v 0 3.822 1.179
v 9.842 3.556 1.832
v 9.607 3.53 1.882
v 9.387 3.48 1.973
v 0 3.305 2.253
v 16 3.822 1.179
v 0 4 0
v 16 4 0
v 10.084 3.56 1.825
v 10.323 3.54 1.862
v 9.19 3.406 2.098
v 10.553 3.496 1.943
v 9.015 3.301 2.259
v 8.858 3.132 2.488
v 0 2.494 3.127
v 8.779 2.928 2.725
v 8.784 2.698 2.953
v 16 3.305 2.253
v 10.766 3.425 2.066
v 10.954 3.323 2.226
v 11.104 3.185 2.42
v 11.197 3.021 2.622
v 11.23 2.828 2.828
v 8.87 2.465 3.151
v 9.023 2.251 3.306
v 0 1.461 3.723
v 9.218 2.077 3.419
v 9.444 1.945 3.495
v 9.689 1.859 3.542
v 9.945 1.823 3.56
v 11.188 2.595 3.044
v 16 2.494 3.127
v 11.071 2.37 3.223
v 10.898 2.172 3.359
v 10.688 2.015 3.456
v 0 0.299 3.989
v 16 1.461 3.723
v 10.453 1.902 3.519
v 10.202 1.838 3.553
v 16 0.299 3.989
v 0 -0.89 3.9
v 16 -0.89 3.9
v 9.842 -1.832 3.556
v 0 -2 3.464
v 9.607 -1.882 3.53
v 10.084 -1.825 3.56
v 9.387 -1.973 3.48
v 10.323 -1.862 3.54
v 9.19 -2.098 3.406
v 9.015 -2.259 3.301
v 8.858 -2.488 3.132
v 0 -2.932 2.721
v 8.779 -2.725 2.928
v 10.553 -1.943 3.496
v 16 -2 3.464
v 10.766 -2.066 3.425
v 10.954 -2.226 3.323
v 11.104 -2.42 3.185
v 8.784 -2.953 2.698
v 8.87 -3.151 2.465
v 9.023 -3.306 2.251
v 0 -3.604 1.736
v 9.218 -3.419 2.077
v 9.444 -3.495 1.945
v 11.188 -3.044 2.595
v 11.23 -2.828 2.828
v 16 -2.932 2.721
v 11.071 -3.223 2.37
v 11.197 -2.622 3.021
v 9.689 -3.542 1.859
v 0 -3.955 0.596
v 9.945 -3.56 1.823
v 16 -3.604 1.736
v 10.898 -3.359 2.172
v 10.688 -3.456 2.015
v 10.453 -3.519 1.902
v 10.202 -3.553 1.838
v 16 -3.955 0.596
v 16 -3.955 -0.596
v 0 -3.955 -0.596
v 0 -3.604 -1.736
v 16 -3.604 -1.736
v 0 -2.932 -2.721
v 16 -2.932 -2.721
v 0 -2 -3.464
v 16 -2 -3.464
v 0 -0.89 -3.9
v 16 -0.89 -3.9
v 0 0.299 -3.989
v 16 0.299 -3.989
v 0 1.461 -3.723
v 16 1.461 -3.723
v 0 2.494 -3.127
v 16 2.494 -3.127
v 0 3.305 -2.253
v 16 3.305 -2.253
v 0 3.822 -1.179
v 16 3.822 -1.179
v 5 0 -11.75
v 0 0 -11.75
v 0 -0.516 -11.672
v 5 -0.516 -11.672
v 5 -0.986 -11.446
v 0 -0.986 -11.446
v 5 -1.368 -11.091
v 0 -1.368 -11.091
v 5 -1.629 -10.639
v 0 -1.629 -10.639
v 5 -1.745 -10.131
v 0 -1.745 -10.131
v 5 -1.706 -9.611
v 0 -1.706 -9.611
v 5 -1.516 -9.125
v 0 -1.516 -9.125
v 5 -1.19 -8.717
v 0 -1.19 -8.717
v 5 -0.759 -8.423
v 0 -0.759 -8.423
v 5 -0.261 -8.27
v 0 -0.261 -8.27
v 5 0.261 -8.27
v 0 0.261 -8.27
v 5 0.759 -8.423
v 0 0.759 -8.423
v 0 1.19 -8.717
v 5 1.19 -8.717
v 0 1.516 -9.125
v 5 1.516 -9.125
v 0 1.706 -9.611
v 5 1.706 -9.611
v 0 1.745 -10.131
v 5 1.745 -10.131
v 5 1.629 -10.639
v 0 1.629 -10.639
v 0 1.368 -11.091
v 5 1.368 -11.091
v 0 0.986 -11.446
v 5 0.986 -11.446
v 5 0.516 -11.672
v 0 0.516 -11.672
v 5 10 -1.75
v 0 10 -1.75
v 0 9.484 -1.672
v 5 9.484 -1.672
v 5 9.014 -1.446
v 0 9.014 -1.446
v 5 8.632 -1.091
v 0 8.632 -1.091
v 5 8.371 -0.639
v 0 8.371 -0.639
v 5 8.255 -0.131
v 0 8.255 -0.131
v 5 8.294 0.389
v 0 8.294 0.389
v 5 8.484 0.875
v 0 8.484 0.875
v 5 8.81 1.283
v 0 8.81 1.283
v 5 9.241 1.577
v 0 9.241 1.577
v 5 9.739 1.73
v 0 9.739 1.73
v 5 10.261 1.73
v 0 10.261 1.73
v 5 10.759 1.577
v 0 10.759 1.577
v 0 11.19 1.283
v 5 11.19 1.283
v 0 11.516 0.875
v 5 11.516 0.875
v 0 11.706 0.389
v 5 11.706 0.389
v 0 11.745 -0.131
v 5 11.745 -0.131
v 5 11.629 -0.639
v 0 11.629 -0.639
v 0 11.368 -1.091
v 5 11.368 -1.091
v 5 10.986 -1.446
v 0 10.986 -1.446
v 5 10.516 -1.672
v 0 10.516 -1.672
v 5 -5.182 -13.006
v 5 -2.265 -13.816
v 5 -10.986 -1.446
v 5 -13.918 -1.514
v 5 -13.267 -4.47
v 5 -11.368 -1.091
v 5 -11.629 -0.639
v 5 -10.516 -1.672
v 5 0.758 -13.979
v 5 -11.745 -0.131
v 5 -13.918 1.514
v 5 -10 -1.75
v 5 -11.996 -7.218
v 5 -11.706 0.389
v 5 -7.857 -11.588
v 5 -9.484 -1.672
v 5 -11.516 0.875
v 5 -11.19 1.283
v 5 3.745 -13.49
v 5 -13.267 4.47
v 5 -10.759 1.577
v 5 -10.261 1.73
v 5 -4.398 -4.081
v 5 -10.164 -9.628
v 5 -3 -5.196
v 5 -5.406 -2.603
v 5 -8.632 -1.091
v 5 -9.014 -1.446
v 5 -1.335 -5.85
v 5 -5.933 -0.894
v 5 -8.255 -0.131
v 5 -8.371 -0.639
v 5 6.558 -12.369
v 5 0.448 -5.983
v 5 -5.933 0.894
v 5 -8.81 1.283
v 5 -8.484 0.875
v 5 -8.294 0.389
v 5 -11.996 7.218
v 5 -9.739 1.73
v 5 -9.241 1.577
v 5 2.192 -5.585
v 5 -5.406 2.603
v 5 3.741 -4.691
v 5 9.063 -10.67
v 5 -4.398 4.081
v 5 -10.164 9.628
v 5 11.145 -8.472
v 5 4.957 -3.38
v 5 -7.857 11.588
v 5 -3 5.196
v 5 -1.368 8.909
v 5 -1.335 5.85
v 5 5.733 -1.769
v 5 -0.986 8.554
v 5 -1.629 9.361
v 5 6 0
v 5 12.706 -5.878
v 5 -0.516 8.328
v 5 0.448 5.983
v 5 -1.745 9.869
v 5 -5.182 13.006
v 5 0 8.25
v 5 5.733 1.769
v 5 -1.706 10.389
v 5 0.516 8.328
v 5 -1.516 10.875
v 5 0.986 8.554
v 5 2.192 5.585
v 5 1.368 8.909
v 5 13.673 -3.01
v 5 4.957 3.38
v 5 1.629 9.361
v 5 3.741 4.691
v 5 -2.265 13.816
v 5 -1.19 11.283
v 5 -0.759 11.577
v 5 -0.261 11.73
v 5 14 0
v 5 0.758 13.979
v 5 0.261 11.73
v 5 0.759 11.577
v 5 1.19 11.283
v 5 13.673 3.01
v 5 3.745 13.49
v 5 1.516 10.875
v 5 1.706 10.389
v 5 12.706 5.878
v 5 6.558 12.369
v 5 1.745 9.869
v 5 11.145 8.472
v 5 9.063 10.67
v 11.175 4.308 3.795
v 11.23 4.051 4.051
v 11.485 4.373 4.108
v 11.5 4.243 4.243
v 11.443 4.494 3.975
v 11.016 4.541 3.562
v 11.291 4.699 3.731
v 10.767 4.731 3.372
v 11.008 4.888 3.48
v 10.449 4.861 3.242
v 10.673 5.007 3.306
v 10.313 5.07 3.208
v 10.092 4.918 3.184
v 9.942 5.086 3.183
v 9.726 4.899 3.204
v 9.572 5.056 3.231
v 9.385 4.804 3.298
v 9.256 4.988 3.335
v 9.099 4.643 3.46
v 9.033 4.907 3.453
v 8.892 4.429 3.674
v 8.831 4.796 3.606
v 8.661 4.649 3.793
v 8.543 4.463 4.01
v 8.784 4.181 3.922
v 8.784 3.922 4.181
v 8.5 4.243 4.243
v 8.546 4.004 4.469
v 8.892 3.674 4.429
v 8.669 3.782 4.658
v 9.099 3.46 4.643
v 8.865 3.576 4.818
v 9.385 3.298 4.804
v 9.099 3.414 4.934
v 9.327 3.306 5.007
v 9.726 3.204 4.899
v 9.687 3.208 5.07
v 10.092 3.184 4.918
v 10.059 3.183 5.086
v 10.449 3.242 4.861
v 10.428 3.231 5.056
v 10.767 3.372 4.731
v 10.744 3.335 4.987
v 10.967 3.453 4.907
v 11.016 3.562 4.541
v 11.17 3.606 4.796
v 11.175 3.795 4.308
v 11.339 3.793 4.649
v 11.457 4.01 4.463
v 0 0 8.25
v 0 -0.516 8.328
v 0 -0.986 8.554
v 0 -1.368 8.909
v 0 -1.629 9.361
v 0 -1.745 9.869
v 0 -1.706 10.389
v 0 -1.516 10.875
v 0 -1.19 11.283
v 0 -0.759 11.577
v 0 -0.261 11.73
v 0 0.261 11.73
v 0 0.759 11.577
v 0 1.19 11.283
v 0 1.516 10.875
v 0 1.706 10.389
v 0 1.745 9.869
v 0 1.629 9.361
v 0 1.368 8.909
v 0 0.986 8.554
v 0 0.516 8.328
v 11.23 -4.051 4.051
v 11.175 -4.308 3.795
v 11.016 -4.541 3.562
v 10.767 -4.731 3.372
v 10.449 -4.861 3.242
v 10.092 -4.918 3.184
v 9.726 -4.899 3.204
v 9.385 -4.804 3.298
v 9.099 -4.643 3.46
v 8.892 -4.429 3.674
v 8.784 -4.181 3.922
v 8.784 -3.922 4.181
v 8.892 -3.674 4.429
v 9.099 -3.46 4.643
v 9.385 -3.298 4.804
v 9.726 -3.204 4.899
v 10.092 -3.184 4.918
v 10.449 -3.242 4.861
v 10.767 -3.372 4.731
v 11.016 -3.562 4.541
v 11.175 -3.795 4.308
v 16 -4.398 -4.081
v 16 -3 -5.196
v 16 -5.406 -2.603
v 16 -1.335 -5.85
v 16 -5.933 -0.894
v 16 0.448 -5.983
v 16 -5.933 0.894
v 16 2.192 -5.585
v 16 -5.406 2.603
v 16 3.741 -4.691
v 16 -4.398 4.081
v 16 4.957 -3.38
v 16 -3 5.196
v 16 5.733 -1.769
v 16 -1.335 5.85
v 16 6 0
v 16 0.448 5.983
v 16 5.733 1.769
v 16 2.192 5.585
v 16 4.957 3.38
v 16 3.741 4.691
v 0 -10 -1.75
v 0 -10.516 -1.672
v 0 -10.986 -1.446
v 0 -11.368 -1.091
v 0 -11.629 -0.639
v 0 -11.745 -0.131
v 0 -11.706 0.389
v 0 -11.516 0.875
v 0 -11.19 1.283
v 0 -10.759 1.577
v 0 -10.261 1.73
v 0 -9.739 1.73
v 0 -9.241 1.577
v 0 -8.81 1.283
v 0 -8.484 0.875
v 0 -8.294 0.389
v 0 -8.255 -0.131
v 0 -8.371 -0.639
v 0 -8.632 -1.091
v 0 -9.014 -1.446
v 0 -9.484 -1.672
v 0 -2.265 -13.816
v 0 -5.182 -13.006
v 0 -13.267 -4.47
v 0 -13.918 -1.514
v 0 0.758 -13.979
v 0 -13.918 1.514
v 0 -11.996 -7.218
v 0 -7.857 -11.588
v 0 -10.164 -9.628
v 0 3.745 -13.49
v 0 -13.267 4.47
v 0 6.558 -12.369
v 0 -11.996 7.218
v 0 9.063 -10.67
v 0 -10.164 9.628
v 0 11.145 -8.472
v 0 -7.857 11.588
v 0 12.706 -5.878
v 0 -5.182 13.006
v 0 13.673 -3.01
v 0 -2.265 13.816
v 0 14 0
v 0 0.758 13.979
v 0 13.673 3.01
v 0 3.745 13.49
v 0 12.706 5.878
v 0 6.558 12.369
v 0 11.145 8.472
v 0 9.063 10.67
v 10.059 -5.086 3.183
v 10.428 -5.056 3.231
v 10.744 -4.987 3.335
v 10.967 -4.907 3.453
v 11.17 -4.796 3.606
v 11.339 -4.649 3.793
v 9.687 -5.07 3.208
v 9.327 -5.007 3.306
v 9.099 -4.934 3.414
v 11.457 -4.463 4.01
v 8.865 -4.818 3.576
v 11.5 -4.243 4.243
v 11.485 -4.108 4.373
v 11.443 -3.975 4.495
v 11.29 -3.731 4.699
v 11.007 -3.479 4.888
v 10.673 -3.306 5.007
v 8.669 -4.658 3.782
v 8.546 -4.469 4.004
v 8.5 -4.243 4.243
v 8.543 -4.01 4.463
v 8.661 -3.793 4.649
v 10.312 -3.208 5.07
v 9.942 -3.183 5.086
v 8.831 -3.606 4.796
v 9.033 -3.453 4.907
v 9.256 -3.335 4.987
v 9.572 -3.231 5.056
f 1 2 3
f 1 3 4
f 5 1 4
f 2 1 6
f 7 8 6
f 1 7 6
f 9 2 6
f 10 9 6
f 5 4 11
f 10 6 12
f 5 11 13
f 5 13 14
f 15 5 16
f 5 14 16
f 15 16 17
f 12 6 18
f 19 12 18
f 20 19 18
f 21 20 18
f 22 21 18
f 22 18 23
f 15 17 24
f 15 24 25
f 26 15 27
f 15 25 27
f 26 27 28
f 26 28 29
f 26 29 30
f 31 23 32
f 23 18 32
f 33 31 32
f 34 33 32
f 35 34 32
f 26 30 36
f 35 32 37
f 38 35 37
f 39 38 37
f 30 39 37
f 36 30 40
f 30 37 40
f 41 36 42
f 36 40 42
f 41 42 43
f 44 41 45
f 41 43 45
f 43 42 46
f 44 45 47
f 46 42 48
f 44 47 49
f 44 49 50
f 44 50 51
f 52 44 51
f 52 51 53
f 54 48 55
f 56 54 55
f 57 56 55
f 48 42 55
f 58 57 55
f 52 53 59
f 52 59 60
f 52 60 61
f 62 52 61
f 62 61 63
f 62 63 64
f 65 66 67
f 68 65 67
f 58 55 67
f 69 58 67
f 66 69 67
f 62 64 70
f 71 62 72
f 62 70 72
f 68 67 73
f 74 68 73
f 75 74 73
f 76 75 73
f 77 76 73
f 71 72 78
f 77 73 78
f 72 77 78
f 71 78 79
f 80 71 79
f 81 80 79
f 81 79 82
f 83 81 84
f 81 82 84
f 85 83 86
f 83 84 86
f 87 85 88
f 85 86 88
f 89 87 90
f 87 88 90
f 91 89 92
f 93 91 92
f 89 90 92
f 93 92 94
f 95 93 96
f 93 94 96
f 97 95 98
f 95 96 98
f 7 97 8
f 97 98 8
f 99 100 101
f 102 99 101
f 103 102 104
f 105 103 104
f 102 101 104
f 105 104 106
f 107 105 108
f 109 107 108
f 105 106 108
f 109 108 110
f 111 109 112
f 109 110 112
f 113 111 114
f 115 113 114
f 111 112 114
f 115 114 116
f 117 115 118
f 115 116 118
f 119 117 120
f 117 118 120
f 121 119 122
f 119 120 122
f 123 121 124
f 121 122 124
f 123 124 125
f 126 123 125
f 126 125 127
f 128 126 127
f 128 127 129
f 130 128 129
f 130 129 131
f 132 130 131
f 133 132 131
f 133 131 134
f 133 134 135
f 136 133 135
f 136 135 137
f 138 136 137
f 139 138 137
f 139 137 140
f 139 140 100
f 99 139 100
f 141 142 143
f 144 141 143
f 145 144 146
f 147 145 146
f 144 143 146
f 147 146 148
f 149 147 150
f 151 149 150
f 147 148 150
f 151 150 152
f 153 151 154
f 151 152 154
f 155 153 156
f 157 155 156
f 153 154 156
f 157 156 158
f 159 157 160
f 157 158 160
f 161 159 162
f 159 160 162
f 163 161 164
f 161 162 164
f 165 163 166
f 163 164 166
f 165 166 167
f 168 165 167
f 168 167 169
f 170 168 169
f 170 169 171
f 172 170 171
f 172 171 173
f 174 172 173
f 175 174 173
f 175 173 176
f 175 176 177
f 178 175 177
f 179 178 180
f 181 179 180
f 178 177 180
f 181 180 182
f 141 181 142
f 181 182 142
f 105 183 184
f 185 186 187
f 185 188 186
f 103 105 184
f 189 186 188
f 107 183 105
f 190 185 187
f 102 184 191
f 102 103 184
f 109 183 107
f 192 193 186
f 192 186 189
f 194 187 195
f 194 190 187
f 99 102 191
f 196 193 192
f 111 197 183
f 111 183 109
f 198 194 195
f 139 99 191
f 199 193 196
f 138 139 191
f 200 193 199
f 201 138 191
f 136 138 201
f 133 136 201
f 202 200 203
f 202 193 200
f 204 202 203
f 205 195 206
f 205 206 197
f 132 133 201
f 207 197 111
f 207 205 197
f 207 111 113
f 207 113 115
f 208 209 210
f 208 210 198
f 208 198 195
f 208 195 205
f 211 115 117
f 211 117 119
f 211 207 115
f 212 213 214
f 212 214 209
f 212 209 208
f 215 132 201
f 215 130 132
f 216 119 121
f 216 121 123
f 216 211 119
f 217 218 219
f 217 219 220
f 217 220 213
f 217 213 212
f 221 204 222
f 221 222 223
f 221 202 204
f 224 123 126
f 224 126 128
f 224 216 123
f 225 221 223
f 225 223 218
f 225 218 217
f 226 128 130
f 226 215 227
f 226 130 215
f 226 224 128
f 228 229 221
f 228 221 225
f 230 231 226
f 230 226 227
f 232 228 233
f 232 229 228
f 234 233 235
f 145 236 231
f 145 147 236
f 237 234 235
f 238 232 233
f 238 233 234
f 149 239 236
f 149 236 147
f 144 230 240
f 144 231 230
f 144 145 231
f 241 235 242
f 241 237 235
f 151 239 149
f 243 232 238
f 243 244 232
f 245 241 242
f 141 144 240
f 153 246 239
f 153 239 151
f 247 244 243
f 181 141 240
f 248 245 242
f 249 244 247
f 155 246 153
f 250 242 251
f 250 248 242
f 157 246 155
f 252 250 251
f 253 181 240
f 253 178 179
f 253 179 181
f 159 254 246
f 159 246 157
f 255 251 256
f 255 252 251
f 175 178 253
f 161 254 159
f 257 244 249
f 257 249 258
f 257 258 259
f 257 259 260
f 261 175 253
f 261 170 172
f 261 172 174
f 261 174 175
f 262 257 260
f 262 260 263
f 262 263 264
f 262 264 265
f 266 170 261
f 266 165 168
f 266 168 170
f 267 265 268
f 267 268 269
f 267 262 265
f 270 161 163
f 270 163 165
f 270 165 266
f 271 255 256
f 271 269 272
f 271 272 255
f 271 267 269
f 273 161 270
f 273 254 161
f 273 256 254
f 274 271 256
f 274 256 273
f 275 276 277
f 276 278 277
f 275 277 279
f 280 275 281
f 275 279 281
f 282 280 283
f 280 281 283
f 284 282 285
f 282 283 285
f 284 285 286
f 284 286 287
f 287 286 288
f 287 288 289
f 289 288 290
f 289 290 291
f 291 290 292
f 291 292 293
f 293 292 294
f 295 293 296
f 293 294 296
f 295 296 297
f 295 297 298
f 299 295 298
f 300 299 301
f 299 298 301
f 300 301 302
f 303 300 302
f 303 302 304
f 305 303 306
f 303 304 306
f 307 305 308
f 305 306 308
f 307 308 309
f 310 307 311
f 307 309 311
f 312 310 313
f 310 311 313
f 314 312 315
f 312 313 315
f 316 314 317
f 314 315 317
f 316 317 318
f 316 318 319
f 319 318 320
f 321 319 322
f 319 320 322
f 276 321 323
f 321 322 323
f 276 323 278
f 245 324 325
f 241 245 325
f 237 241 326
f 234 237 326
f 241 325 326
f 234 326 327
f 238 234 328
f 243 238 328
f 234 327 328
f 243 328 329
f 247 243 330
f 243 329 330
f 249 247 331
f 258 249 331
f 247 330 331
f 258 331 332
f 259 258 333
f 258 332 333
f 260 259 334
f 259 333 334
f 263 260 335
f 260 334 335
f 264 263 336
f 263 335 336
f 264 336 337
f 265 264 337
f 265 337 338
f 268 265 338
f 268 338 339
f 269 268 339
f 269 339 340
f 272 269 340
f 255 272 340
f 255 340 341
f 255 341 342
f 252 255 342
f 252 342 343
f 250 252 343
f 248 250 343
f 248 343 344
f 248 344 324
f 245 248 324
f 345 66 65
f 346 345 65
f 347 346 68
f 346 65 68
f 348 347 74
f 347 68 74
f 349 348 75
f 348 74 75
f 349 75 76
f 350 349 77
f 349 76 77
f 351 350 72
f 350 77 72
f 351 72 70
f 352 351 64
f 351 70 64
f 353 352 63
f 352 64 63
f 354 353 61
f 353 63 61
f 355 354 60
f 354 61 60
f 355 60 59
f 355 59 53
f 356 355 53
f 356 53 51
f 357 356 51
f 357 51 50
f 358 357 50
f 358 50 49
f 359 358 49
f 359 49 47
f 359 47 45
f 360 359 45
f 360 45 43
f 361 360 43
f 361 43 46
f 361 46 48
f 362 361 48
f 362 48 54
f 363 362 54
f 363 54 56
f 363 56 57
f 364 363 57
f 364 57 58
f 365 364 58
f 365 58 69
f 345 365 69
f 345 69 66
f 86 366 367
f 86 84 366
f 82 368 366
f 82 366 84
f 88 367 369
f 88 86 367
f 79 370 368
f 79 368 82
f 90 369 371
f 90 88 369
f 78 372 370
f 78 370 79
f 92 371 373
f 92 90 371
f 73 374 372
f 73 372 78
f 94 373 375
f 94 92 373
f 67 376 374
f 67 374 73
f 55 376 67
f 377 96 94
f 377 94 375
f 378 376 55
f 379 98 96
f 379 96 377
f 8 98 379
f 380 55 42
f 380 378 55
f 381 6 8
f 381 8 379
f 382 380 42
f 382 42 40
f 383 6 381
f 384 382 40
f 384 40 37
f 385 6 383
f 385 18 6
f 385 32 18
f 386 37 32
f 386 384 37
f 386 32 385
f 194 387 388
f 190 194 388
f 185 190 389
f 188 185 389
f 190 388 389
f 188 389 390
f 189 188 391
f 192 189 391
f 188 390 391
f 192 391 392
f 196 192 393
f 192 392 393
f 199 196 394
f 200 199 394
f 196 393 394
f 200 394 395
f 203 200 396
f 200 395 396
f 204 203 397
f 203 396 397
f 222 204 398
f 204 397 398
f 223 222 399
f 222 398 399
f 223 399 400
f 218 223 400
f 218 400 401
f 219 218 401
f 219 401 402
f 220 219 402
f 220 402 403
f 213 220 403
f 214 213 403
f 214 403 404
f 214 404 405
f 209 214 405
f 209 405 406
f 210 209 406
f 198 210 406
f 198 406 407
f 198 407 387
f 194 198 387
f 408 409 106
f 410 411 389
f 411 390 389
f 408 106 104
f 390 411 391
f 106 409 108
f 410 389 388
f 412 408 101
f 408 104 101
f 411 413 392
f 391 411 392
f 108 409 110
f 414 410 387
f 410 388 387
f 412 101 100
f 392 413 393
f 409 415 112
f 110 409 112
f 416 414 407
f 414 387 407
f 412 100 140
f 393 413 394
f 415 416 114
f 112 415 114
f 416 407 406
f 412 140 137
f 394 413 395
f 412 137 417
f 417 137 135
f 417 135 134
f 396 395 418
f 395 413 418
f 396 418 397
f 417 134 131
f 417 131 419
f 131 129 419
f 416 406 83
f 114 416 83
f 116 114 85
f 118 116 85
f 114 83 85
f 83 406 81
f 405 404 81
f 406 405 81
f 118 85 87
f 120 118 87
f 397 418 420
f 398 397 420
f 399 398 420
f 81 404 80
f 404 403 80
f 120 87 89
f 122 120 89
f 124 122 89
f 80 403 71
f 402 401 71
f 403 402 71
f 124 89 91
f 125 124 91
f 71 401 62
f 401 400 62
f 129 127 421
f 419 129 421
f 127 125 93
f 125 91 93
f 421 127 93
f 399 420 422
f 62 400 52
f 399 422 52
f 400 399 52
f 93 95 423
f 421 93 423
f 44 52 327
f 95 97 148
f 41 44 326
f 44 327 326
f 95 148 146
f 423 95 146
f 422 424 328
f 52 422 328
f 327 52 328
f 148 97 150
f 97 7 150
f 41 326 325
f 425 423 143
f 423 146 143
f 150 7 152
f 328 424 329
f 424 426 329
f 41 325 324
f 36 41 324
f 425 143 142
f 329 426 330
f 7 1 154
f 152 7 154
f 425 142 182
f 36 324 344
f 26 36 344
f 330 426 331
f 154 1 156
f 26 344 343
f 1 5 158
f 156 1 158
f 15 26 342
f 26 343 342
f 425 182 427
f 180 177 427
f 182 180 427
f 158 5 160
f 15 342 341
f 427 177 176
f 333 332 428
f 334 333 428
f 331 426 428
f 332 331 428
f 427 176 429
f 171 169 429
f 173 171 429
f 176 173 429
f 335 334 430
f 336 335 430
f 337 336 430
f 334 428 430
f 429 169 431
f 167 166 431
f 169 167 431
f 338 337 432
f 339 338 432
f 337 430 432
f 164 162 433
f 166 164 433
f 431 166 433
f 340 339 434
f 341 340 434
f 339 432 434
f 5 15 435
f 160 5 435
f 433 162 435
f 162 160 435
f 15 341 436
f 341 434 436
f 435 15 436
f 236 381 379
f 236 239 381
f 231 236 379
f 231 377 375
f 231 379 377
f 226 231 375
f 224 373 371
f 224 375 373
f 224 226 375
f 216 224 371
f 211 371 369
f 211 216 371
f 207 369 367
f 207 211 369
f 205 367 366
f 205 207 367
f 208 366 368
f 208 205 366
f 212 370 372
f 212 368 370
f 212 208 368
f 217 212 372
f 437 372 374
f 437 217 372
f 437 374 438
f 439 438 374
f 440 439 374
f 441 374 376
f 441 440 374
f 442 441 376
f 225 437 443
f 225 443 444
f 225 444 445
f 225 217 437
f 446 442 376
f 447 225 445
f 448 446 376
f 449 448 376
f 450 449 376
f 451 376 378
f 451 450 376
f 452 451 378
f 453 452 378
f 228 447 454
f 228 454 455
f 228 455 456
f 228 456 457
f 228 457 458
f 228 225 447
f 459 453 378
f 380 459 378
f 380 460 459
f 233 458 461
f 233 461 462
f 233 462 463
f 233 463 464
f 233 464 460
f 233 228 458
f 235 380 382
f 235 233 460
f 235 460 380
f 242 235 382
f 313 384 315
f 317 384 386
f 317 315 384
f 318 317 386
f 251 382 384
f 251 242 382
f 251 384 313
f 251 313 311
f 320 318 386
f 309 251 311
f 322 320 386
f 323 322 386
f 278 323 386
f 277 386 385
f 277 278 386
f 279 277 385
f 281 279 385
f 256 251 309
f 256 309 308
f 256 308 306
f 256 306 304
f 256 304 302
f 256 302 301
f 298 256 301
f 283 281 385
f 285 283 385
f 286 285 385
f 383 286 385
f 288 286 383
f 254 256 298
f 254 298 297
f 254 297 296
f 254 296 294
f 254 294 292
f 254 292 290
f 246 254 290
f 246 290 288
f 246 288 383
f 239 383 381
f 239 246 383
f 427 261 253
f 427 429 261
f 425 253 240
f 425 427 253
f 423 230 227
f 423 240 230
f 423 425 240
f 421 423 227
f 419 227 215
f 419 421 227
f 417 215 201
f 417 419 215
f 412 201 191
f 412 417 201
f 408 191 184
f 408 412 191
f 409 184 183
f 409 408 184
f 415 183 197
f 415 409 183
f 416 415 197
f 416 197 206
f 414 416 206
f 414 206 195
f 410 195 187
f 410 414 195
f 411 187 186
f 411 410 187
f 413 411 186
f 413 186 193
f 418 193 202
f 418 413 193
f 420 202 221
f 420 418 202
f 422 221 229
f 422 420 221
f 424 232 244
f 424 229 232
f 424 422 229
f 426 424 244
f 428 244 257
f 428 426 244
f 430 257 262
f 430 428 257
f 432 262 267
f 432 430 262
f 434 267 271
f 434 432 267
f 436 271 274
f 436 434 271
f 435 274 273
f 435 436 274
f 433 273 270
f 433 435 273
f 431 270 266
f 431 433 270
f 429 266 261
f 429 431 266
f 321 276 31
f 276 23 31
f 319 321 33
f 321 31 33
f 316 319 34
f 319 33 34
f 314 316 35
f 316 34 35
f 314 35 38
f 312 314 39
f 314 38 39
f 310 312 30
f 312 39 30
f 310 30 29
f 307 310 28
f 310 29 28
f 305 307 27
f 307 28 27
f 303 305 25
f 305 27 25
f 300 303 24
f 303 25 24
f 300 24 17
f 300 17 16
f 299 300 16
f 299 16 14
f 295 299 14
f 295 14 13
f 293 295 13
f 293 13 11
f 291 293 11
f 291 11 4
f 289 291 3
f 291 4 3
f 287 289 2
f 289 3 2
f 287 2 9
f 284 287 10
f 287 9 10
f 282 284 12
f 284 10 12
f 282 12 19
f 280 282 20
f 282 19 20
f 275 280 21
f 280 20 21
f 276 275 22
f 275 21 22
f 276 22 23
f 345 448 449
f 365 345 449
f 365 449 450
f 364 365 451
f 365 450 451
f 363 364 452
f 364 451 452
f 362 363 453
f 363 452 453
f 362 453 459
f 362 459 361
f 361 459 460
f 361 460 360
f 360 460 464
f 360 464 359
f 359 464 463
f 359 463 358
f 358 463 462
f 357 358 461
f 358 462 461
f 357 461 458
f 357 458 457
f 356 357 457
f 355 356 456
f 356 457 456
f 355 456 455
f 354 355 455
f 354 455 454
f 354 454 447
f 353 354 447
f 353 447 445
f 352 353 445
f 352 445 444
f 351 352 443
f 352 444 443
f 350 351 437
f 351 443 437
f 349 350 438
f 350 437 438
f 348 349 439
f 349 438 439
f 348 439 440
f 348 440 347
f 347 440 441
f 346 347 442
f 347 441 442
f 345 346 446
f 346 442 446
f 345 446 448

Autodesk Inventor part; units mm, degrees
ref_plane "YZ Plane" through (0, 0, 0) normal (1, 0, 0) x (0, 1, 0)
ref_plane "XZ Plane" through (0, 0, 0) normal (0, 1, 0) x (-1, 0, 0)
ref_plane "XY Plane" through (0, 0, 0) normal (0, 0, 1) x (1, 0, 0)
sketch "Sketch_1" plane through (0, 0, 0) normal (0, 0, 1) x (1, 0, 0)
  line L0 (16, 0) -> (0, 0)
  line L1 (0, 4) -> (16, 4)
  line L2 (16, 4) -> (16, 6)
  line L3 (16, 6) -> (5, 6)
  line L4 (5, 6) -> (5, 14)
  line L5 (5, 14) -> (0, 14)
  line L6 (0, 14) -> (0, 4)
revolve "Revolution1" add sketch "Sketch_1" angle 360 about axis through (16, 0, 0) along (1, 0, 0)
sketch "Sketch_3" plane through (0, 0, 0) normal (0, -0.7071, 0.7071) x (1, 0, 0)
  line L0 (10, 3.5) -> (10, 6)
  line L1 (10, 6) -> (11.5, 6)
  line L2 (11.5, 6) -> (11.2295, 5.7295)
  line L3 (11.2295, 5.7295) -> (11.2295, 3.5)
  line L4 (11.2295, 3.5) -> (10, 3.5)
  line L5 (10, 3.5) -> (10, 6)
revolve "Revolution2" cut sketch "Sketch_3" angle 360 about axis through (10, 2.4749, 2.4749) along (0, -0.7071, -0.7071)
thread "Thread1" size "M3x0.5" class "6H" standard "ISO Metric profile" length 2.2295
sketch "Sketch3" plane through (5, 0, 0) normal (1, 0, 0) x (0, 0, -1)
  point P0 (0, 10)
hole "Hole1" at (5, 10, 0) direction (-1, 0, 0) diameter 3.5 depth 5
sketch "Sketch4" plane through (5, 0, 0) normal (1, 0, 0) x (0, 0, -1)
  point P0 (0, -10)
hole "Hole2" at (5, -10, 0) direction (-1, 0, 0) diameter 3.5 depth 5
sketch "Sketch5" plane through (5, 0, 0) normal (1, 0, 0) x (0, 0, -1)
  point P0 (-10, 0)
hole "Hole3" at (5, 0, 10) direction (-1, 0, 0) diameter 3.5 depth 5
sketch "Sketch6" plane through (5, 0, 0) normal (1, 0, 0) x (0, 0, -1)
  point P0 (10, 0)
hole "Hole4" at (5, 0, -10) direction (-1, 0, 0) diameter 3.5 depth 5
sketch "Sketch_2" plane through (0, 0, 0) normal (0, -0.7071, -0.7071) x (1, 0, 0)
  line L0 (10, 3.5) -> (10, 6)
  line L1 (10, 6) -> (11.5, 6)
  line L2 (11.5, 6) -> (11.2295, 5.7295)
  line L3 (11.2295, 5.7295) -> (11.2295, 3.5)
  line L4 (11.2295, 3.5) -> (10, 3.5)
  line L5 (10, 3.5) -> (10, 6)
revolve "Revolution3" cut sketch "Sketch_2" angle 360 about axis through (10, -2.4749, 2.4749) along (0, 0.7071, -0.7071)
thread "Thread2" size "M3x0.5" class "6H" standard "ISO Metric profile" length 2.2295
properties part number "STHRB8_b"
